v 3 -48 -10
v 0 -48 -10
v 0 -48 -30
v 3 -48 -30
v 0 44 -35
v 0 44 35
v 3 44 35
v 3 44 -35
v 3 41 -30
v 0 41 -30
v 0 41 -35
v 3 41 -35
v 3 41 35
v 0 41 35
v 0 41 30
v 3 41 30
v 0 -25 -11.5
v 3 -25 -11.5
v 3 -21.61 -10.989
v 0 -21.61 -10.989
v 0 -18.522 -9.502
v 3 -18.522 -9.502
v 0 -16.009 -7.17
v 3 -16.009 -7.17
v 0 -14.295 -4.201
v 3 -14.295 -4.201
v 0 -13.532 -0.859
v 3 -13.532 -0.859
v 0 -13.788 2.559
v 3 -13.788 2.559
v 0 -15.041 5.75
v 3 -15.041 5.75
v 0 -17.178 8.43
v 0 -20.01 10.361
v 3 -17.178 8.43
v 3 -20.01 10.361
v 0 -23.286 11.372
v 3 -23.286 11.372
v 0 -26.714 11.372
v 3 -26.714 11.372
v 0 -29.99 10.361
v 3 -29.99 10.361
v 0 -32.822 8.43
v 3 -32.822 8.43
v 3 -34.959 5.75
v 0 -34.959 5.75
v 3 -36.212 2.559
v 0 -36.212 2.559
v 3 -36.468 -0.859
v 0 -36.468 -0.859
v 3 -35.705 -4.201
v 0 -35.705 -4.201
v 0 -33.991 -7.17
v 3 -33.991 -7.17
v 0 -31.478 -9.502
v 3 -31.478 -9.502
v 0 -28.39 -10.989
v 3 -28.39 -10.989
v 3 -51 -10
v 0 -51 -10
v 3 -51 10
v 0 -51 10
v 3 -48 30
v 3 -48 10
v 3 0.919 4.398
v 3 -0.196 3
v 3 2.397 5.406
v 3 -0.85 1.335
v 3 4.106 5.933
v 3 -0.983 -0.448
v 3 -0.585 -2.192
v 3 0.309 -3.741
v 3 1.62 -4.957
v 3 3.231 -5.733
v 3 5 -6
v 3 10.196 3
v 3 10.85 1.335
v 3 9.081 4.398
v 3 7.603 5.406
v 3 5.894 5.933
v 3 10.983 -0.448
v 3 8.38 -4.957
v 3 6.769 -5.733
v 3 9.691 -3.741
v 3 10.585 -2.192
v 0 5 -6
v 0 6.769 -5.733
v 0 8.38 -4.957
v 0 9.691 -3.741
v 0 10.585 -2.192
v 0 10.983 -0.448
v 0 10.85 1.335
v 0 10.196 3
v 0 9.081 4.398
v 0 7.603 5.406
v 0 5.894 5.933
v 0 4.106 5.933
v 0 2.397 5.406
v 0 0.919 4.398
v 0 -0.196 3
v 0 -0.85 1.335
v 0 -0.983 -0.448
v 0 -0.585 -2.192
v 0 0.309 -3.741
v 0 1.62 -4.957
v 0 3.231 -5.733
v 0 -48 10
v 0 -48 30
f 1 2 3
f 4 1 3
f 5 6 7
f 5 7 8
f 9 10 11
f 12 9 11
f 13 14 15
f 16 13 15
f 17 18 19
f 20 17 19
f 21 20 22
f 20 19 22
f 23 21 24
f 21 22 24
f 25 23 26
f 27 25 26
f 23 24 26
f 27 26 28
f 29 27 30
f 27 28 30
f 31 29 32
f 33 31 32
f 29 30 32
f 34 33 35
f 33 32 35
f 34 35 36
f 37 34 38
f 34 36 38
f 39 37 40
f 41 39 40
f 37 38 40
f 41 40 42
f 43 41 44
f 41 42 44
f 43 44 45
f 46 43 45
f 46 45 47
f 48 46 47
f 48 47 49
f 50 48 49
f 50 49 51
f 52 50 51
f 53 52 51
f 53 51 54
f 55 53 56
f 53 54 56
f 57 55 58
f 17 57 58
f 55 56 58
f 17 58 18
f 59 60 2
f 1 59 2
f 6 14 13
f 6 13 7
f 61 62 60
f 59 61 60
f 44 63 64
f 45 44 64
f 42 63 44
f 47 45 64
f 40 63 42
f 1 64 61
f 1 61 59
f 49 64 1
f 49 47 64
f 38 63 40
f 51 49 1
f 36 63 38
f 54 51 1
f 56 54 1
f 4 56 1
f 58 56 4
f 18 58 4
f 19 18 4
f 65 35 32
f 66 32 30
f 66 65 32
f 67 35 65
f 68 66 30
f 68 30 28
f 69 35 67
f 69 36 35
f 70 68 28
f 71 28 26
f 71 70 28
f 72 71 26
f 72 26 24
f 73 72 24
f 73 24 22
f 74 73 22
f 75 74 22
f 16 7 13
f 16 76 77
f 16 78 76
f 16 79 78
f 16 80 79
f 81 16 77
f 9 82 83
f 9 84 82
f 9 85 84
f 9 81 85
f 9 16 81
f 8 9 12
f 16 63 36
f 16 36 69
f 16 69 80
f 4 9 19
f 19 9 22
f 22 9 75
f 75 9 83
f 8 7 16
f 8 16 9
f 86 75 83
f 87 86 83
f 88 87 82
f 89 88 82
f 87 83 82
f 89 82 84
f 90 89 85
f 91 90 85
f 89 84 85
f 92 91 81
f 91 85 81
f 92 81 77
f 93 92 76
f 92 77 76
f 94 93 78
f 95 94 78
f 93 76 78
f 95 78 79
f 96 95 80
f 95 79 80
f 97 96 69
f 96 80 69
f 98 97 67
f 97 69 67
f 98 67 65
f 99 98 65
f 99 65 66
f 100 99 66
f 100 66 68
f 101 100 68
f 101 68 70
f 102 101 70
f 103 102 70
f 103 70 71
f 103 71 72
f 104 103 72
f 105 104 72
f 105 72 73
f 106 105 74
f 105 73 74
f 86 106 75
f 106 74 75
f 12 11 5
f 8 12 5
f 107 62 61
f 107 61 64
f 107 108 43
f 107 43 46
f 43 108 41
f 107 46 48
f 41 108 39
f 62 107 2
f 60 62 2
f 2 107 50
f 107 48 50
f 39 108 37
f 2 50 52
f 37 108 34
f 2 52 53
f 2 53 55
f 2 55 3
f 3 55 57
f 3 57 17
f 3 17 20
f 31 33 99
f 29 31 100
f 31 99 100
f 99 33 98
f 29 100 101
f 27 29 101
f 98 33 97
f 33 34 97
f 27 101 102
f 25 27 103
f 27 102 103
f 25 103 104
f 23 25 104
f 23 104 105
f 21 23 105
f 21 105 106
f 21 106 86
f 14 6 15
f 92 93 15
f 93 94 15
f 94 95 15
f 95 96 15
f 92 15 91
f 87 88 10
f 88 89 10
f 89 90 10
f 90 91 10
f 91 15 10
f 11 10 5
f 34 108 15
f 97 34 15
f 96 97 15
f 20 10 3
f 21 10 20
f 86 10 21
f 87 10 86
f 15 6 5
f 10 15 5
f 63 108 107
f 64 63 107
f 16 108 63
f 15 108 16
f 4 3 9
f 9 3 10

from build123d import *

# Parameters (mm, degrees)
SKETCH1_W           = 60
SKETCH1_H           = 96
BOSS_EXTRUDE1_DEPTH = 3
SKETCH2_R           = 11.5
SKETCH2_R_2         = 6
CUT_EXTRUDE1_DEPTH  = 3
SKETCH3_W           = 5
SKETCH3_H           = 3
SKETCH3_W_2         = 20
BOSS_EXTRUDE2_DEPTH = 3
SKETCH6_W           = 60
SKETCH6_H           = 4
CUT_EXTRUDE2_DEPTH  = 10


with BuildPart() as part:
    # Sketch1 → Boss-Extrude1 (new body)
    with BuildSketch(Plane(origin=(0, 0, 0), x_dir=(0, 0, -1), z_dir=(1, 0, 0))):
        Rectangle(SKETCH1_W, SKETCH1_H)
    extrude(amount=BOSS_EXTRUDE1_DEPTH)

    # Sketch2 → Cut-Extrude1 (cut)
    with BuildSketch(Plane(origin=(3, 0, 0), x_dir=(0, 0, -1), z_dir=(1, 0, 0))):
        with Locations((0, -25)):
            Circle(SKETCH2_R)
        with Locations((0, 5)):
            Circle(SKETCH2_R_2)
    extrude(amount=-CUT_EXTRUDE1_DEPTH, mode=Mode.SUBTRACT)

    # Sketch3 → Boss-Extrude2 (add)
    with BuildSketch(Plane(origin=(0, 0, 0), x_dir=(0, 0, -1), z_dir=(1, 0, 0))):
        with Locations((-32.5, 42.5)):
            Rectangle(SKETCH3_W, SKETCH3_H)
        with Locations((32.5, 42.5)):
            Rectangle(SKETCH3_W, SKETCH3_H)
        with Locations((0, -49.5)):
            Rectangle(SKETCH3_W_2, SKETCH3_H)
    extrude(amount=BOSS_EXTRUDE2_DEPTH)

    # Sketch6 → Cut-Extrude2 (cut)
    with BuildSketch(Plane(origin=(3, 0, 0), x_dir=(0, 0, -1), z_dir=(1, 0, 0))):
        with Locations((0, 46)):
            Rectangle(SKETCH6_W, SKETCH6_H)
    extrude(amount=-CUT_EXTRUDE2_DEPTH, mode=Mode.SUBTRACT)


solid = part.part
